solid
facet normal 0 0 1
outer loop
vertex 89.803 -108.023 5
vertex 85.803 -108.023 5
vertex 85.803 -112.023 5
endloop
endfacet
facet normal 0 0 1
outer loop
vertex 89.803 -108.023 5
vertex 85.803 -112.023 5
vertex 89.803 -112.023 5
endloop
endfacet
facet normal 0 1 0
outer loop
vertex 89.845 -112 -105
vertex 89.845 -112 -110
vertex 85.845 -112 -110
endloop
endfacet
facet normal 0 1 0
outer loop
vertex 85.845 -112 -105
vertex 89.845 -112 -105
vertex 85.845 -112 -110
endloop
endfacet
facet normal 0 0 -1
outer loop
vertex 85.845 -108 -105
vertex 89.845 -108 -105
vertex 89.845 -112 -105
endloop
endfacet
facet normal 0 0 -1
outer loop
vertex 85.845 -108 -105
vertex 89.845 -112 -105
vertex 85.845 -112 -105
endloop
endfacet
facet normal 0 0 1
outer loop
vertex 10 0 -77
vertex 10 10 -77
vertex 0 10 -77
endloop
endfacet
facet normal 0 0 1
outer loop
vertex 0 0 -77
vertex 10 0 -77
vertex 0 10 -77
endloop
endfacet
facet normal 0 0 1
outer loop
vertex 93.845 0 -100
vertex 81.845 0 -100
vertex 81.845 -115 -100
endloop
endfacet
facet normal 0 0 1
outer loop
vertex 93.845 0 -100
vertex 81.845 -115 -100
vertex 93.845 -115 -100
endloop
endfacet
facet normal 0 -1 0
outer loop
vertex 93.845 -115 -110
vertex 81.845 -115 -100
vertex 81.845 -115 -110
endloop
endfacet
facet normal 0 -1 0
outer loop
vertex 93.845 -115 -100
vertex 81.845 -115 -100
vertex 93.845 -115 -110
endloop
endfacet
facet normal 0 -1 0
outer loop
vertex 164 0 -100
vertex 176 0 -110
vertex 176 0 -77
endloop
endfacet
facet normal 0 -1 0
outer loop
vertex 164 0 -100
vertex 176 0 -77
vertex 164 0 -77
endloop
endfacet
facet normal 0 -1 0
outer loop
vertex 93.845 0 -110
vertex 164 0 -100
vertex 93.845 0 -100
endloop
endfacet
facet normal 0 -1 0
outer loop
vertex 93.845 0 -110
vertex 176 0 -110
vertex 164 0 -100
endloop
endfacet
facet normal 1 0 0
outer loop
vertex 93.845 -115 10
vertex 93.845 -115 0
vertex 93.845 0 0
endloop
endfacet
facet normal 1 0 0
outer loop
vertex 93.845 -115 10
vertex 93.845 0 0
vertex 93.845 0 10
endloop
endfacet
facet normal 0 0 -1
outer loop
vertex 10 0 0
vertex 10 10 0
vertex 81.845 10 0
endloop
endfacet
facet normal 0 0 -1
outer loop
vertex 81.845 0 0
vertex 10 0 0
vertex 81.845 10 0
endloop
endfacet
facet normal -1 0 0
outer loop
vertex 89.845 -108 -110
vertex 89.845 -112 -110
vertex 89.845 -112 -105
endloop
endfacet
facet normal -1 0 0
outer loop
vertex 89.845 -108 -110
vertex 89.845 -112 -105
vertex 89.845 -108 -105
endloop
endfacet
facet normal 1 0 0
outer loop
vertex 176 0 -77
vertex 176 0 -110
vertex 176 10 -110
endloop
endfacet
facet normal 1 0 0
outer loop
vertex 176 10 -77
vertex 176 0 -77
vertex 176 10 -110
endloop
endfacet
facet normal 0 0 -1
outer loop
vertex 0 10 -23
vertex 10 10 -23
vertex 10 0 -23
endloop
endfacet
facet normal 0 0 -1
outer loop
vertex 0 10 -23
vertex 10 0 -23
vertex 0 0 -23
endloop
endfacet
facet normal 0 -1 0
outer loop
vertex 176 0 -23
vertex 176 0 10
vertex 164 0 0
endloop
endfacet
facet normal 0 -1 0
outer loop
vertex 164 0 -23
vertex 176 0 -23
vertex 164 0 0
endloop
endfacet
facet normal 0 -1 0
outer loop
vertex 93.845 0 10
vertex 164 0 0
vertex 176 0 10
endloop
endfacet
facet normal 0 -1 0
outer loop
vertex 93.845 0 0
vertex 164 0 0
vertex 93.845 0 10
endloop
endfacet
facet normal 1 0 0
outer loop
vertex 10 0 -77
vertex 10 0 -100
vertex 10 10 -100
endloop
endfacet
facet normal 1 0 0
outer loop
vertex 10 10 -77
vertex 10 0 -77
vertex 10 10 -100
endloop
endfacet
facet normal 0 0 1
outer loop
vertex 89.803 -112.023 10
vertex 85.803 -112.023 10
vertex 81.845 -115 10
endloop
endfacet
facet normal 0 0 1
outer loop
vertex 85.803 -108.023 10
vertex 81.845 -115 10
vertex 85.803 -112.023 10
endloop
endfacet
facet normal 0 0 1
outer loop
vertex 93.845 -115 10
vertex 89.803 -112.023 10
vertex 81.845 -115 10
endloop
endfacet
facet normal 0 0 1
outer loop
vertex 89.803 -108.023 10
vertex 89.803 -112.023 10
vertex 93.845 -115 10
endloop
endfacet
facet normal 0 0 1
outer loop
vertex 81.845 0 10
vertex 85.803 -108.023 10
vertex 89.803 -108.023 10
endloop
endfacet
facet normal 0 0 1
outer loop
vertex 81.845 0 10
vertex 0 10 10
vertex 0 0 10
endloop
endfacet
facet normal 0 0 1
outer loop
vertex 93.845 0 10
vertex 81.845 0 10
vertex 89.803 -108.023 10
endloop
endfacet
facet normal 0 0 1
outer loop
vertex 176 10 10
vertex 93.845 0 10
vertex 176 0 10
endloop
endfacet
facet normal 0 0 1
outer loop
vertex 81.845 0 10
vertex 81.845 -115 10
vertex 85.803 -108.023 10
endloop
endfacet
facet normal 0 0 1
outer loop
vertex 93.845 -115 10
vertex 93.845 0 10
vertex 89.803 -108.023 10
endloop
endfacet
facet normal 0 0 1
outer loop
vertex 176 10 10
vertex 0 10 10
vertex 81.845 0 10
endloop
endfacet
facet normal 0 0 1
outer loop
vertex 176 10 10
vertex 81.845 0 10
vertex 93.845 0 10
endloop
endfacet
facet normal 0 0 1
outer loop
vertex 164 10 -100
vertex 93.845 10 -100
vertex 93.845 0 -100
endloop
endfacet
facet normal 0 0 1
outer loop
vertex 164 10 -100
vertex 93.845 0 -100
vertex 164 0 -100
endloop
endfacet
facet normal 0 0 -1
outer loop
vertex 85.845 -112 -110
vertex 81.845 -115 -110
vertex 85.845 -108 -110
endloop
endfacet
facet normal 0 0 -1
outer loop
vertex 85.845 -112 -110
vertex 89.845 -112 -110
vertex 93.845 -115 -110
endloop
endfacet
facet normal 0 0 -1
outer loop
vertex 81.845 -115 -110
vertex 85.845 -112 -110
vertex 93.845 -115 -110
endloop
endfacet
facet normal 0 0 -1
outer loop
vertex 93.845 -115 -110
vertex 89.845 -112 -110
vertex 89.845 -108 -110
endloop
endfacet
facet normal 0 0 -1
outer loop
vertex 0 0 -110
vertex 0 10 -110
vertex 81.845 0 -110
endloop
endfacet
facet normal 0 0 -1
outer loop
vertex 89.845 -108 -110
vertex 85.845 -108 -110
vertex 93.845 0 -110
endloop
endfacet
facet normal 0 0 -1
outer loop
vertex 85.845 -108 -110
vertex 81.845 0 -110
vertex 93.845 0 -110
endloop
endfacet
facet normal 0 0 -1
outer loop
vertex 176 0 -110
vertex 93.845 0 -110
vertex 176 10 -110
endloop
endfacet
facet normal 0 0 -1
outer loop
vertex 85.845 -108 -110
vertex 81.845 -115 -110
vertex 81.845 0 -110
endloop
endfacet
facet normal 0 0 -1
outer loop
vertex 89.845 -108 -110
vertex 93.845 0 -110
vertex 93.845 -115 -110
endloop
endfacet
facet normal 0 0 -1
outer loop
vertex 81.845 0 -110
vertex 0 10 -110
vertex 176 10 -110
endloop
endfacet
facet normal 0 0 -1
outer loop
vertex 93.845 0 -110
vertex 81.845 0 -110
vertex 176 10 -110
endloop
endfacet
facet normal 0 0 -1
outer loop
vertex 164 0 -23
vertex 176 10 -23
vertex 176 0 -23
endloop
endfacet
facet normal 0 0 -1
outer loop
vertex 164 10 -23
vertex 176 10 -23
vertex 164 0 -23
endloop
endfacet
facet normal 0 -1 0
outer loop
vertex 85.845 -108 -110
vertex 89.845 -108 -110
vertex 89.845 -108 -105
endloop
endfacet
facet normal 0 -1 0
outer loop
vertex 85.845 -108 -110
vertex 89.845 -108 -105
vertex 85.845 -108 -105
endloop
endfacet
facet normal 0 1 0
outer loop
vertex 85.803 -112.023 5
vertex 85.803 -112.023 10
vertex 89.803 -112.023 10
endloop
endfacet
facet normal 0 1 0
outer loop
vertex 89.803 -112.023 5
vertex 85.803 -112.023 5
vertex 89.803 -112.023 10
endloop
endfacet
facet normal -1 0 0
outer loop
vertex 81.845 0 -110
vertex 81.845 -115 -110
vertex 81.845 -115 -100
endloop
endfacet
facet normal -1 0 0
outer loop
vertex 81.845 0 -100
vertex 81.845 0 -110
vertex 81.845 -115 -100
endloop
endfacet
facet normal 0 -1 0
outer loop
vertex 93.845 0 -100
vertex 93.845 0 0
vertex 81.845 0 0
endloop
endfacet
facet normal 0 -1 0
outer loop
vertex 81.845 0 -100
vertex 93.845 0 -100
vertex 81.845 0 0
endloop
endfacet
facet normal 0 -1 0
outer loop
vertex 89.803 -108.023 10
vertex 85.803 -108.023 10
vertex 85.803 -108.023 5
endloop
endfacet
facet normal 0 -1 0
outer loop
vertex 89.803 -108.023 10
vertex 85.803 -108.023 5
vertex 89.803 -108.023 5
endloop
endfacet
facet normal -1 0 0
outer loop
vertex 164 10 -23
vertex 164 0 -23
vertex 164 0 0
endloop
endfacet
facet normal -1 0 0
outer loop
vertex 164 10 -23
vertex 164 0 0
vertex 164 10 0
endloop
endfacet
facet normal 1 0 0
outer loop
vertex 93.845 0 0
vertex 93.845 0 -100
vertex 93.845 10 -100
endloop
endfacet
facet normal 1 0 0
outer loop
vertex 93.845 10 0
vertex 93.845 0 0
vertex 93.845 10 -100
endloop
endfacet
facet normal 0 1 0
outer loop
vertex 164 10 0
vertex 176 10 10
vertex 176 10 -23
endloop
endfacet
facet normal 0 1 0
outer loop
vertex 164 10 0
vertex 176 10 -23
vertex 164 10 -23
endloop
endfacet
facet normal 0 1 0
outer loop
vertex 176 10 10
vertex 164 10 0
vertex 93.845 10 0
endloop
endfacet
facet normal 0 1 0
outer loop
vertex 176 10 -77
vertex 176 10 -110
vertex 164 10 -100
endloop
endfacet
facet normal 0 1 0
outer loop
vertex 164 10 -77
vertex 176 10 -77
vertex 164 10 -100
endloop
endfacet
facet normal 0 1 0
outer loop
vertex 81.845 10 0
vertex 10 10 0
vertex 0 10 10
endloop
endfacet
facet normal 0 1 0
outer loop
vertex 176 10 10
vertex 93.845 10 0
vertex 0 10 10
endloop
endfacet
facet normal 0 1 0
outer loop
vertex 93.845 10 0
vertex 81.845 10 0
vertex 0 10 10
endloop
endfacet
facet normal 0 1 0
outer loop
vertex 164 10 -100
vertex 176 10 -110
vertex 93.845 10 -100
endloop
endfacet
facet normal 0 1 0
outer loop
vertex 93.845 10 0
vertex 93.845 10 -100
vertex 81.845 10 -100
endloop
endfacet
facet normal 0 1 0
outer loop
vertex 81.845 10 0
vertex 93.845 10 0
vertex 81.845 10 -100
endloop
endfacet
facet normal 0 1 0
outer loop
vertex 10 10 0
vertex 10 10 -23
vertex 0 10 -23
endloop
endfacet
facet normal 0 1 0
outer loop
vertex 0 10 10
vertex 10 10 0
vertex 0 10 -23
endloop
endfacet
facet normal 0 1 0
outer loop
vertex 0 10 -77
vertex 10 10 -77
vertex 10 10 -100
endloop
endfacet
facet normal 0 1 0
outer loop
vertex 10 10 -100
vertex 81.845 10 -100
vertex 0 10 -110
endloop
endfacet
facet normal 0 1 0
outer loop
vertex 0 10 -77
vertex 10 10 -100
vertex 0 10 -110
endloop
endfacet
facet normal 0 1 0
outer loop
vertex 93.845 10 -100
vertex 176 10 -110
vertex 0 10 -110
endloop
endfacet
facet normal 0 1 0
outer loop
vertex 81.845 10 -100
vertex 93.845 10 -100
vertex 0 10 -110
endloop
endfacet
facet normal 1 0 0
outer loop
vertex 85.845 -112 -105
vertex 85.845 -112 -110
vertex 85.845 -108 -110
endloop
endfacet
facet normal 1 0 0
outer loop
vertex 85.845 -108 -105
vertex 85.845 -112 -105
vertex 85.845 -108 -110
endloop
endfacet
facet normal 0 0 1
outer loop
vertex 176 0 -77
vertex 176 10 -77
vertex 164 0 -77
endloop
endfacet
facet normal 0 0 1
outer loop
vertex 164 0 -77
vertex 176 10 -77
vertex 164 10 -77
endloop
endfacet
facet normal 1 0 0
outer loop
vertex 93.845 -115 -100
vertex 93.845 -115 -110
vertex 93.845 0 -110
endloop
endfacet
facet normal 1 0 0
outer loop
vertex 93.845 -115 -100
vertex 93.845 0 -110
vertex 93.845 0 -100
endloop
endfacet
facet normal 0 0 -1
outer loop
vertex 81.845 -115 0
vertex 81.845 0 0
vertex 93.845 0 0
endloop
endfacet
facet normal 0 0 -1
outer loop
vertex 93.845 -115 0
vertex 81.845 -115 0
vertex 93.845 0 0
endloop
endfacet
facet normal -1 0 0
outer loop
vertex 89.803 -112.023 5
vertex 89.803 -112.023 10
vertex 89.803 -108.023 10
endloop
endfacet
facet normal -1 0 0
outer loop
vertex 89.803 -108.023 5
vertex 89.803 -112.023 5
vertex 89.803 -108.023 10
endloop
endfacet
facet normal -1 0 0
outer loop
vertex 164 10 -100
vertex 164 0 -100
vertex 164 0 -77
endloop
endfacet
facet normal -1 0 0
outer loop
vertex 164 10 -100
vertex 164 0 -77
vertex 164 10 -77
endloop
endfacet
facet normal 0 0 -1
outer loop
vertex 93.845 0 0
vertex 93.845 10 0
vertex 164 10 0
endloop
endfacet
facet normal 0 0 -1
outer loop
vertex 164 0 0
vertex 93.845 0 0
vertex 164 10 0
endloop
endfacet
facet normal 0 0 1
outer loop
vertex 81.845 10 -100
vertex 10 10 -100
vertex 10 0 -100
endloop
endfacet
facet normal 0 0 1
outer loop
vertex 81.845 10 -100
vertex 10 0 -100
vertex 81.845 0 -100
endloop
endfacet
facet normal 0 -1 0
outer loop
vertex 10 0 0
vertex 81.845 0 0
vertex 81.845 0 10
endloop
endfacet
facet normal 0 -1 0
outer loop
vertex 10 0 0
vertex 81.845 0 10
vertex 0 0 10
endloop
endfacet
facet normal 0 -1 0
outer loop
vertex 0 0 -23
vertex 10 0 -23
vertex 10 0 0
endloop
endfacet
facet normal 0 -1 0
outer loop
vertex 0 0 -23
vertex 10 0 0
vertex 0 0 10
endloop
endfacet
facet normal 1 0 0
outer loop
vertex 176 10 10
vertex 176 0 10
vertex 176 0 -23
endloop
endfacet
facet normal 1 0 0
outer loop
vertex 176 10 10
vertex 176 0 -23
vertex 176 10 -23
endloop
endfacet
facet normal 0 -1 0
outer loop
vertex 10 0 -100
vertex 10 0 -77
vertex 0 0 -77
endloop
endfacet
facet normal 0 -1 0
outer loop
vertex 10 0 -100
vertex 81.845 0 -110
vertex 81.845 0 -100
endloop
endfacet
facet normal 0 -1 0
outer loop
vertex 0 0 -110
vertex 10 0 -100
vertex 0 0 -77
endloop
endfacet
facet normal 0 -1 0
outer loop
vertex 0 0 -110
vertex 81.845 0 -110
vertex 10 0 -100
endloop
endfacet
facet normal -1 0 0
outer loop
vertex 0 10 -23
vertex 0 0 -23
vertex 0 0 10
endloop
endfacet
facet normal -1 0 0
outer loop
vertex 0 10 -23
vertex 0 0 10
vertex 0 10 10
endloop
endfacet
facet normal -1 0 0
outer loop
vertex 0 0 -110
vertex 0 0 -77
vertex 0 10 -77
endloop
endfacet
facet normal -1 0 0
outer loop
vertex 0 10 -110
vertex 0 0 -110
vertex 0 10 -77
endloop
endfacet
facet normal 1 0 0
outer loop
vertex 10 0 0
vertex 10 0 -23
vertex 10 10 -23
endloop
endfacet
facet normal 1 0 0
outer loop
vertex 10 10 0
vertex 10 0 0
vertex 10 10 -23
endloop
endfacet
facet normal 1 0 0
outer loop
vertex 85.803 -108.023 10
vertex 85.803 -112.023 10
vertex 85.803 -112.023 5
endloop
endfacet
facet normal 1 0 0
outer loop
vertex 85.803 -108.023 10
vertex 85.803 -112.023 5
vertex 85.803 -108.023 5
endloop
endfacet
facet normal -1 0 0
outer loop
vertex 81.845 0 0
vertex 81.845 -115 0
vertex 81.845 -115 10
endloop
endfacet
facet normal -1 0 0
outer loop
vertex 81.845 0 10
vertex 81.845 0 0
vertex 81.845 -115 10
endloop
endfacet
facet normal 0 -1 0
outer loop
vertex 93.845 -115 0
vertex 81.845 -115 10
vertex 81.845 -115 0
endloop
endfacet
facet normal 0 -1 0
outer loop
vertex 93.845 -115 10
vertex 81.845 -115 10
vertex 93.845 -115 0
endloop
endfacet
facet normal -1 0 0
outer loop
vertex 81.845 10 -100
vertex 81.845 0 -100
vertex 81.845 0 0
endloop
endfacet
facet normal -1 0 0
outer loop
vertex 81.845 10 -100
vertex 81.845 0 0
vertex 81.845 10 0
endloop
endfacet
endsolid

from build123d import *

# Parameters (mm, degrees)
SKETCH1_W           = 176
SKETCH1_H           = 10
BOSS_EXTRUDE1_DEPTH = 10
SKETCH2_W           = 12
SKETCH2_H           = 10
BOSS_EXTRUDE2_DEPTH = 50
SKETCH3_W           = 10
SKETCH3_H           = 10
SKETCH3_W_2         = 12
BOSS_EXTRUDE3_DEPTH = 23
SKETCH4_W           = 12
SKETCH4_H           = 10
BOSS_EXTRUDE4_DEPTH = 115
SKETCH6_W           = 4
SKETCH6_H           = 4
CUT_EXTRUDE1_DEPTH  = 5
SKETCH7_W           = 4
SKETCH7_H           = 4
CUT_EXTRUDE2_DEPTH  = 5


with BuildPart() as part:
    # Sketch1 → Boss-Extrude1 (new body)
    with BuildSketch(Plane.XY):
        with Locations((88, 5)):
            Rectangle(SKETCH1_W, SKETCH1_H)
    extrude(amount=BOSS_EXTRUDE1_DEPTH)

    # Sketch2 → Boss-Extrude2 (add)
    with BuildSketch(Plane(origin=(0, 0, 0), x_dir=(-1, 0, 0), z_dir=(0, 0, -1))):
        with Locations((-87.845258849, 5)):
            Rectangle(SKETCH2_W, SKETCH2_H)
    extrude(amount=BOSS_EXTRUDE2_DEPTH)

    # Sketch3 → Boss-Extrude3 (add)
    with BuildSketch(Plane(origin=(0, 0, 0), x_dir=(-1, 0, 0), z_dir=(0, 0, -1))):
        with Locations((-5, 5)):
            Rectangle(SKETCH3_W, SKETCH3_H)
        with Locations((-170, 5)):
            Rectangle(SKETCH3_W_2, SKETCH3_H)
    extrude(amount=BOSS_EXTRUDE3_DEPTH)

    # Mirror6: part across plane


with BuildPart() as part_1:
    add(part.part)
    add(part.part.mirror(Plane.XY.offset(-50)))

    # Sketch4 → Boss-Extrude4 (add)
    with BuildSketch(Plane.XZ):
        with Locations((87.845258849, 5)):
            Rectangle(SKETCH4_W, SKETCH4_H)
        with Locations((87.845258849, -105)):
            Rectangle(SKETCH4_W, SKETCH4_H)
    extrude(amount=BOSS_EXTRUDE4_DEPTH)

    # Sketch6 → Cut-Extrude1 (cut)
    with BuildSketch(Plane.XY.offset(10)):
        with Locations((87.80305242, -110.022825142)):
            Rectangle(SKETCH6_W, SKETCH6_H)
    extrude(amount=-CUT_EXTRUDE1_DEPTH, mode=Mode.SUBTRACT)

    # Sketch7 → Cut-Extrude2 (cut)
    with BuildSketch(Plane(origin=(0, 0, -110), x_dir=(-1, 0, 0), z_dir=(0, 0, -1))):
        with Locations((-87.845258849, -110)):
            Rectangle(SKETCH7_W, SKETCH7_H)
    extrude(amount=-CUT_EXTRUDE2_DEPTH, mode=Mode.SUBTRACT)


solid = part_1.part
